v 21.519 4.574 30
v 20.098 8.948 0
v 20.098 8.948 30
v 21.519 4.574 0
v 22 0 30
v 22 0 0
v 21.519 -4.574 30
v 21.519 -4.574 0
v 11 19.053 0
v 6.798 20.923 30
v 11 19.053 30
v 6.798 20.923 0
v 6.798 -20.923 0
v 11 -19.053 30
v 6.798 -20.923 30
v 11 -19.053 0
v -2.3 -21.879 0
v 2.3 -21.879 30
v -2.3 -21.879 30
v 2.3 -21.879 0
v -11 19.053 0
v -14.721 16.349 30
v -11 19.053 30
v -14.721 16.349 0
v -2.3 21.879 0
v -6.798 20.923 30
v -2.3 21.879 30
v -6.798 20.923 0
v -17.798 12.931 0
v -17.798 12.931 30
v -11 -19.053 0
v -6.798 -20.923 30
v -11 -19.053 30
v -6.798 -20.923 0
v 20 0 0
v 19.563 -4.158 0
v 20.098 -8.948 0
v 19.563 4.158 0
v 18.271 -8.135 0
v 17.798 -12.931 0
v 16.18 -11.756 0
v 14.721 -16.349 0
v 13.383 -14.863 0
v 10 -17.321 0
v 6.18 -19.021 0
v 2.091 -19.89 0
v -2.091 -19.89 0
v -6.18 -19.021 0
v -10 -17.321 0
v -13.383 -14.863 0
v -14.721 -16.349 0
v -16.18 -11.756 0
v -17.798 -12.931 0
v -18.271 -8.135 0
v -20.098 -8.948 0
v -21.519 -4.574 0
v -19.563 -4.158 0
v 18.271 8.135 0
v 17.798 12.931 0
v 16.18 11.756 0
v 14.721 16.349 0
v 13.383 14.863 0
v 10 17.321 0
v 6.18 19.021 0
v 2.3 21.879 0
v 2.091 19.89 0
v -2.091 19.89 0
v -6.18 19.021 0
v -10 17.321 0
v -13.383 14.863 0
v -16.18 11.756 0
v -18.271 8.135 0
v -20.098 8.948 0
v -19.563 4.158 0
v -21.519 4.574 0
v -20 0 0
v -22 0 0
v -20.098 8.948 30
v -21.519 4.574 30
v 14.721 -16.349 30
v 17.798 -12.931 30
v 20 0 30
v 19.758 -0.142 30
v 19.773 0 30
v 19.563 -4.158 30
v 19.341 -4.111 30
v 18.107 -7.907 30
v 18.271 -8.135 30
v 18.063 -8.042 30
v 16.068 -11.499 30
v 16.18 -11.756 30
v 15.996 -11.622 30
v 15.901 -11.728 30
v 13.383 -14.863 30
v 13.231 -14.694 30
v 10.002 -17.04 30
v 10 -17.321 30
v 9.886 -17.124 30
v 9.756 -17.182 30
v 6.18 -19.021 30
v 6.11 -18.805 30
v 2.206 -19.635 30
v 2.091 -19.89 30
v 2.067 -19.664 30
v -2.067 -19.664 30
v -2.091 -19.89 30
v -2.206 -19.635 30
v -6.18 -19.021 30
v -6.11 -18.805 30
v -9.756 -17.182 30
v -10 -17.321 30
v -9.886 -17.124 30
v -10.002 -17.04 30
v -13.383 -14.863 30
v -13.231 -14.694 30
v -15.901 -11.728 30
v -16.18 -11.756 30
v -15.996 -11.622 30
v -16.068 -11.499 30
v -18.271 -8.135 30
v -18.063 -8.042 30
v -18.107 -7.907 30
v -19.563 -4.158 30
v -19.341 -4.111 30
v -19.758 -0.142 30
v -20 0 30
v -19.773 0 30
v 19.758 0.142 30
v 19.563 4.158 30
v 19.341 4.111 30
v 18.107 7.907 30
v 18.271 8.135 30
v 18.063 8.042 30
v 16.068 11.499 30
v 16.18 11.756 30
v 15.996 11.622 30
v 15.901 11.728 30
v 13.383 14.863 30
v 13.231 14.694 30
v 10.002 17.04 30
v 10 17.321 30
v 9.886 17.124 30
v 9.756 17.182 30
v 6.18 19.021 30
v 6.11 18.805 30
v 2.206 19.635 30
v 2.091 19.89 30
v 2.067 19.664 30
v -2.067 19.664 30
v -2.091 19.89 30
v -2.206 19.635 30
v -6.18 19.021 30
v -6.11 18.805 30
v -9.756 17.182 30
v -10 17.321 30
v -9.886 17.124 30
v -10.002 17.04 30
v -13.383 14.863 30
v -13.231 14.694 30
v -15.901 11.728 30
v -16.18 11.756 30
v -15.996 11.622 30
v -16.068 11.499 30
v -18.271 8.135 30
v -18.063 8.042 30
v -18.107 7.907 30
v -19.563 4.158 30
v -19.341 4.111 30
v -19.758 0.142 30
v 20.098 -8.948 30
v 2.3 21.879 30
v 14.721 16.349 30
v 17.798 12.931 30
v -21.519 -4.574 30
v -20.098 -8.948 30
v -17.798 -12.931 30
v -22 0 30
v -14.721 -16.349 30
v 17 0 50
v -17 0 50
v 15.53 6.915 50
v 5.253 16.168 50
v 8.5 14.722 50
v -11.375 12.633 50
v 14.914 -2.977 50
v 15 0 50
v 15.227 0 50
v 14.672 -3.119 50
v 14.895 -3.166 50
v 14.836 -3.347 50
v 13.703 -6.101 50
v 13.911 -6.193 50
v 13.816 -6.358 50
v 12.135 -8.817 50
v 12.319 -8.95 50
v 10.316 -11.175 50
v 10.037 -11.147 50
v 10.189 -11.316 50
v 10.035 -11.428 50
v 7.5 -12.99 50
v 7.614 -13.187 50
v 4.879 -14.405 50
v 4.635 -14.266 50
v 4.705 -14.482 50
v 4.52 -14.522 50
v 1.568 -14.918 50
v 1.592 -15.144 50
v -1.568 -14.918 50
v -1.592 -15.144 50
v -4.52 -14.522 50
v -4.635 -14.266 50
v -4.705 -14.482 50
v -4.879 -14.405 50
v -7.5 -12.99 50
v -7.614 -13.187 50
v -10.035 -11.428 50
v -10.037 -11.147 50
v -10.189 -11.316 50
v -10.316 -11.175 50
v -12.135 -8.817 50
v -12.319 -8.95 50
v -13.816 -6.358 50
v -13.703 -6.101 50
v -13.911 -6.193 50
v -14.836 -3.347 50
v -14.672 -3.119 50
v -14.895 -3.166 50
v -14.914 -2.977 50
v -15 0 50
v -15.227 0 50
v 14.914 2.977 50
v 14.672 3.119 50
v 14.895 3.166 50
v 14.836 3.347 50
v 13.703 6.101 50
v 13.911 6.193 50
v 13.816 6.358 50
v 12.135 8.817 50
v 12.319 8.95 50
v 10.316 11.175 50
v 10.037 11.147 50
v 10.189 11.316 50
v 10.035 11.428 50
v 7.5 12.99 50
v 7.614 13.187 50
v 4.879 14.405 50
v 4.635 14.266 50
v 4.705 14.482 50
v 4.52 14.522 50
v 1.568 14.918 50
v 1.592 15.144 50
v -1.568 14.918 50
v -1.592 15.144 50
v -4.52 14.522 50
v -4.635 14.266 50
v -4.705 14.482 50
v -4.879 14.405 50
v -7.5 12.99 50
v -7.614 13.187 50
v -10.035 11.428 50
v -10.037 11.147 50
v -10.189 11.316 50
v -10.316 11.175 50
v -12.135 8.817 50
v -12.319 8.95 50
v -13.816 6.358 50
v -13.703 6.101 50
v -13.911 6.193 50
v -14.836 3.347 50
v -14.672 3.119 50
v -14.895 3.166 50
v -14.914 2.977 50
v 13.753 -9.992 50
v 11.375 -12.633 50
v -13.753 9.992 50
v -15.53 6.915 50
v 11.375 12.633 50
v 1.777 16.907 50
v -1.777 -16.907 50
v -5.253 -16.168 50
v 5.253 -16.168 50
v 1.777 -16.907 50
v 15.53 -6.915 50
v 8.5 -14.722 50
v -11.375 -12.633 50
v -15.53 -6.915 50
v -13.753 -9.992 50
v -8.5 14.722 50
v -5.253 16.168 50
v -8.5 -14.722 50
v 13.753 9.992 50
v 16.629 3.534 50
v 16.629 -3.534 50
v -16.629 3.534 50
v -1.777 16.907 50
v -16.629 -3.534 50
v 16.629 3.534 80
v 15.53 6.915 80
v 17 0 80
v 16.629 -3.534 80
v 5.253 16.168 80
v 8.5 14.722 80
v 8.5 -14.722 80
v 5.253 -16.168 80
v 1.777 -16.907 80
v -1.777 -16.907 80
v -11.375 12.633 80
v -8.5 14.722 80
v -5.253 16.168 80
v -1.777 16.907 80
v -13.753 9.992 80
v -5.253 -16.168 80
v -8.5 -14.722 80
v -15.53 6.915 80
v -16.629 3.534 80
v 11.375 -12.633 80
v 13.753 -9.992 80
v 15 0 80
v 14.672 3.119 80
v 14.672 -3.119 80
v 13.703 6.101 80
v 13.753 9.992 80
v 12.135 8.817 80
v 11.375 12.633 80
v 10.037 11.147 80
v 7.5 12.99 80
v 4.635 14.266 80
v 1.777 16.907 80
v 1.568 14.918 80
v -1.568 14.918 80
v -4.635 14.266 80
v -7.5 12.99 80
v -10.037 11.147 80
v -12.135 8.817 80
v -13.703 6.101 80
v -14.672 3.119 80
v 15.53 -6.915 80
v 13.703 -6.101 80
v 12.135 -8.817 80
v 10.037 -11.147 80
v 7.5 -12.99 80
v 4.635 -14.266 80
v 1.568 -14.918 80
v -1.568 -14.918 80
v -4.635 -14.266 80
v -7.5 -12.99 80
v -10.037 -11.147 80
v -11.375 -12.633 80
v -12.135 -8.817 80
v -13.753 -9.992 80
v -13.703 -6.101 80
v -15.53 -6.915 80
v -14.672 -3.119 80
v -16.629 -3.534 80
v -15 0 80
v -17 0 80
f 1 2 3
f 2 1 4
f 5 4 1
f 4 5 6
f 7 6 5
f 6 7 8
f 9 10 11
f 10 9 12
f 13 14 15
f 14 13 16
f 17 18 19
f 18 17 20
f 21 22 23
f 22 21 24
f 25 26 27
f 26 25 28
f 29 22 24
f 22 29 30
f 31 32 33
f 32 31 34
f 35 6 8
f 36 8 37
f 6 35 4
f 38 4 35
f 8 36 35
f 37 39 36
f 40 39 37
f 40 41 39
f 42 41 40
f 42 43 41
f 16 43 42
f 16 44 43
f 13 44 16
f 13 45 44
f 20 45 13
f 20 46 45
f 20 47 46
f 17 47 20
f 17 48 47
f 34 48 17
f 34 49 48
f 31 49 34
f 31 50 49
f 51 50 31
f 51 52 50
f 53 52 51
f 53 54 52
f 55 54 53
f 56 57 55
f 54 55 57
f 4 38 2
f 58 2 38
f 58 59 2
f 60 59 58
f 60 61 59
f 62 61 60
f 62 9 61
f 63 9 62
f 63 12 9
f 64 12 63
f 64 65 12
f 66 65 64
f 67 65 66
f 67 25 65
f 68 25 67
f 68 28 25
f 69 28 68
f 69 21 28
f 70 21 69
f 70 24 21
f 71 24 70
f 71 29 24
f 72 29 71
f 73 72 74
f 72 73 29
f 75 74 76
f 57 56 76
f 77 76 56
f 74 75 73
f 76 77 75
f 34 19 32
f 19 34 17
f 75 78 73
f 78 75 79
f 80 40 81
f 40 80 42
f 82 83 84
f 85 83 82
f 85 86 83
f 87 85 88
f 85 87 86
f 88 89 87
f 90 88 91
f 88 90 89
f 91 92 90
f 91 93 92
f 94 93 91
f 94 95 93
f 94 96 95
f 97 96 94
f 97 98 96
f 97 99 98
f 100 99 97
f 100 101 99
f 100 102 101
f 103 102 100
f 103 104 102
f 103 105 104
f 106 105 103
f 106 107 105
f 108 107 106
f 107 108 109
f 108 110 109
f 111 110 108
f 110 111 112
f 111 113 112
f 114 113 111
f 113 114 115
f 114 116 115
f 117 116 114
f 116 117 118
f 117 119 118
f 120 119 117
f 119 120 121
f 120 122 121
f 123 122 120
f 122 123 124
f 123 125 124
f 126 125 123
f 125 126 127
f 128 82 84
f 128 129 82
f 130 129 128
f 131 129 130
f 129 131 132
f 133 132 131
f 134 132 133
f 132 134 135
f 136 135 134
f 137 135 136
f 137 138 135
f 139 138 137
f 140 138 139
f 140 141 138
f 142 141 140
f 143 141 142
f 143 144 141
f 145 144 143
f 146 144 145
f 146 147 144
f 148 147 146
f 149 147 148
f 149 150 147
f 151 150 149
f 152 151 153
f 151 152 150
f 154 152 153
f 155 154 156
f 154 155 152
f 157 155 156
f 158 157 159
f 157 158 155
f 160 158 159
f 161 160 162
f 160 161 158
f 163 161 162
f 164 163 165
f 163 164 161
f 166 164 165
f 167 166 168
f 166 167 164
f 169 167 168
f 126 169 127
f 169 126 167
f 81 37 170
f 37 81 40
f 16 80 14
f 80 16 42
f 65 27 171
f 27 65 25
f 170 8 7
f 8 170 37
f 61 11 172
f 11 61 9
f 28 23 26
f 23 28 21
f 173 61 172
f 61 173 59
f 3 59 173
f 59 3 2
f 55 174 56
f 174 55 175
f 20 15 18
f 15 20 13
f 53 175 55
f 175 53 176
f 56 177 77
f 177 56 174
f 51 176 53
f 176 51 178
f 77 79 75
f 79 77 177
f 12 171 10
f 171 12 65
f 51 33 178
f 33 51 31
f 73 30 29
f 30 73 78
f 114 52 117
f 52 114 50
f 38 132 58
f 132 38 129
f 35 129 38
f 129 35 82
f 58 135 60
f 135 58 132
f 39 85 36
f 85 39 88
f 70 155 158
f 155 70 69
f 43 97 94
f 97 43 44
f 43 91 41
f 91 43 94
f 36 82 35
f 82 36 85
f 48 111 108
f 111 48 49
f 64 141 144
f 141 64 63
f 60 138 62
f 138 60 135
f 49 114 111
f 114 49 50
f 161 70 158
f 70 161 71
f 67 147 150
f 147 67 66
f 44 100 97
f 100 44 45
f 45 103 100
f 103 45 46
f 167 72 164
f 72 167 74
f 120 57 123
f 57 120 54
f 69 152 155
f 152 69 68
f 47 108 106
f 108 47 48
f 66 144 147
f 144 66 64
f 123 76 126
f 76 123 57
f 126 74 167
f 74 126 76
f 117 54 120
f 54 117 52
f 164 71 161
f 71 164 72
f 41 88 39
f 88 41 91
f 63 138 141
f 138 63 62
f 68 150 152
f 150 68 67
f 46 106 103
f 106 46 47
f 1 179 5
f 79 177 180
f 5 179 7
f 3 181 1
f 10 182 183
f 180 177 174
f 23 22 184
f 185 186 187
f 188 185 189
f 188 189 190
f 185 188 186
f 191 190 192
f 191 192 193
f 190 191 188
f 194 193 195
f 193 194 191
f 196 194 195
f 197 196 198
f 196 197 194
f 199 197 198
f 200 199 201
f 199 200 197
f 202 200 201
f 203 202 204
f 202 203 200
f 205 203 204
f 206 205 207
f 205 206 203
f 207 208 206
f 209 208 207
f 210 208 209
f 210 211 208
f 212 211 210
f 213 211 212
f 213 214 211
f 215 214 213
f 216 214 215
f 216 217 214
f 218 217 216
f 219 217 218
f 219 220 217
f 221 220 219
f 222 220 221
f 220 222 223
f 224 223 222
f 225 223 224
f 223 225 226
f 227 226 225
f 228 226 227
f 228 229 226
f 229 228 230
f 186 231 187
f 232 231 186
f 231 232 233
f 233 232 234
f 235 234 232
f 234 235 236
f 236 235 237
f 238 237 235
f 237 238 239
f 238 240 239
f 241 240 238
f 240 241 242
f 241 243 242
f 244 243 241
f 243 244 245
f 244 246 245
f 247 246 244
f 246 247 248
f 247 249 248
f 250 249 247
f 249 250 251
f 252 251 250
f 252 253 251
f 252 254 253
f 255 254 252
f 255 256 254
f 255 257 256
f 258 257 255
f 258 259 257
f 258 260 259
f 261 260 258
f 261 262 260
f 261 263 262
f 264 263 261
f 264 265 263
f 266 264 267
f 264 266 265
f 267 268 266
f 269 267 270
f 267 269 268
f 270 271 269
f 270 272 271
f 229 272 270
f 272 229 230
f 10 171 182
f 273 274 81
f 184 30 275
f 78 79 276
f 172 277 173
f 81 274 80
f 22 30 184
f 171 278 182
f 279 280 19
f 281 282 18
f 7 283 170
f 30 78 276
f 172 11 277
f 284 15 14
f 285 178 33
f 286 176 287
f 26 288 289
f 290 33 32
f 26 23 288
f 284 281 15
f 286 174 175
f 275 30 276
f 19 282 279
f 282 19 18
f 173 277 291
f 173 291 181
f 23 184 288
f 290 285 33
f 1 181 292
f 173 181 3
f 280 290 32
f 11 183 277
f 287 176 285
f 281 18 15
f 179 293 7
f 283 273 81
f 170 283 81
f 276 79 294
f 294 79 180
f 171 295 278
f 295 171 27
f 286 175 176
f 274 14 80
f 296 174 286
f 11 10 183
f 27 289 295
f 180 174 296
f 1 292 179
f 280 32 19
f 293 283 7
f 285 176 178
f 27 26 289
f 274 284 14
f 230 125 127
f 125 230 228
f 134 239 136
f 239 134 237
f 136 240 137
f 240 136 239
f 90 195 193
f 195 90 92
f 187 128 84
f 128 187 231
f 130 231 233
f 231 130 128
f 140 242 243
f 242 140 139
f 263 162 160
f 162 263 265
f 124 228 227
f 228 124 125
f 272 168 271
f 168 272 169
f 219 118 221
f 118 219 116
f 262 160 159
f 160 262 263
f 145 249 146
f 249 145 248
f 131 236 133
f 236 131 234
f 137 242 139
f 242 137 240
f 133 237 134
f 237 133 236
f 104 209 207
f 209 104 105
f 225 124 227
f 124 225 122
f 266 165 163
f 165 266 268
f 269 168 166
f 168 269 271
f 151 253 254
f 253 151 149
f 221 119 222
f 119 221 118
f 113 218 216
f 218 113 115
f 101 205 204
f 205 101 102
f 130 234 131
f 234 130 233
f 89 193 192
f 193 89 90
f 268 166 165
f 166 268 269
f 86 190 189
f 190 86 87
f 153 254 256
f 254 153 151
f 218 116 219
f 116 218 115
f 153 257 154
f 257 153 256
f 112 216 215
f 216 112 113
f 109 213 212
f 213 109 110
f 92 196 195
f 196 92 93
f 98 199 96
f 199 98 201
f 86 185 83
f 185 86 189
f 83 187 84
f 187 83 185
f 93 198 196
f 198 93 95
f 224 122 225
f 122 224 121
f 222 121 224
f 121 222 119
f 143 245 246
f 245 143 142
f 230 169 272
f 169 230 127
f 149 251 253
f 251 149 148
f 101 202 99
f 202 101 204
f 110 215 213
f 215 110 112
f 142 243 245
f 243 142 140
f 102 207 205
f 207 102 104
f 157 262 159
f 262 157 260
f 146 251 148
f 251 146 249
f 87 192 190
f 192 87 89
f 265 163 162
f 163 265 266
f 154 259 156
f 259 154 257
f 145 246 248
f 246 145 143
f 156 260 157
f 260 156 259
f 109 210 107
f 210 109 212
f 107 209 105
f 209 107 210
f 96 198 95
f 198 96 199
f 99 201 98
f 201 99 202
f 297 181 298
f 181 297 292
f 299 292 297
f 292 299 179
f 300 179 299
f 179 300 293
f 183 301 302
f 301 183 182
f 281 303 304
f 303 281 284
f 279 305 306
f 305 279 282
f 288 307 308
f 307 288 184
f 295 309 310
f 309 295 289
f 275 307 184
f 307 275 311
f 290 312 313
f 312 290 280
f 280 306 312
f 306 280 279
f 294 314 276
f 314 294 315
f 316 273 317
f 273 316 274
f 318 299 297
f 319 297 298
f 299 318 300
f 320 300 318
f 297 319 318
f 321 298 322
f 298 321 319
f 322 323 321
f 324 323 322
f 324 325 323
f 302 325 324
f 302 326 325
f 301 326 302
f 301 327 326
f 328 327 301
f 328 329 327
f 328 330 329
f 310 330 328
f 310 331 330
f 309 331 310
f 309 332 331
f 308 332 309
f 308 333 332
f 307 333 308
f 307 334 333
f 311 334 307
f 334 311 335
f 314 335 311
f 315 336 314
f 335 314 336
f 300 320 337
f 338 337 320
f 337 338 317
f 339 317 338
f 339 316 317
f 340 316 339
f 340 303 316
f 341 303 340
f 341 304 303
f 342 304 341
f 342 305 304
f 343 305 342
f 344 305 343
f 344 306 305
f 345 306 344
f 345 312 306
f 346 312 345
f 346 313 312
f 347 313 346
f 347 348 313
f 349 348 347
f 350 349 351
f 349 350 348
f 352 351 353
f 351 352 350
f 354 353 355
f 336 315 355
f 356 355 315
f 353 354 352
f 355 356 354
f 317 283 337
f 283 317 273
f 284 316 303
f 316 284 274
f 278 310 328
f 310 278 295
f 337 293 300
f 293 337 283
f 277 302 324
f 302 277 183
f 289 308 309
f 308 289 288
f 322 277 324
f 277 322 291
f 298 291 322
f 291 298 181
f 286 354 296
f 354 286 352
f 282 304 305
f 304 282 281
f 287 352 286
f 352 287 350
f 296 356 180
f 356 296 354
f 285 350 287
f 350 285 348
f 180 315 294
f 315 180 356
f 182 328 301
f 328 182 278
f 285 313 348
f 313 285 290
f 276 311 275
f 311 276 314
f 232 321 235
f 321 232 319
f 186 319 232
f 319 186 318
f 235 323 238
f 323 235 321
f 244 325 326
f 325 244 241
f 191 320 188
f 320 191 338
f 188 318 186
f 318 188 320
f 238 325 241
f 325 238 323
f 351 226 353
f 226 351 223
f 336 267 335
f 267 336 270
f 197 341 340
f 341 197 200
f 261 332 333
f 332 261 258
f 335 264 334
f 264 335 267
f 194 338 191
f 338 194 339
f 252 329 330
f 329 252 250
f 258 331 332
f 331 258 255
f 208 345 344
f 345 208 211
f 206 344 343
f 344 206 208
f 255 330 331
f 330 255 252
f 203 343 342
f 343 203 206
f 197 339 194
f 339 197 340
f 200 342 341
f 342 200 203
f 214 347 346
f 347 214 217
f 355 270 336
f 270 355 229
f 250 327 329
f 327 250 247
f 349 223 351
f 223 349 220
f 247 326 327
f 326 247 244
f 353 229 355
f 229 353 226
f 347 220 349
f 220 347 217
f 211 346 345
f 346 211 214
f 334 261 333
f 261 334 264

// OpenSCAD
module rohr(l, innen, dicke) {
difference() {
    
    cylinder(l, innen+dicke, innen+dicke);
    translate([0, 0, -1]) cylinder(l+2, innen, innen);
}
}

rohr(30, 20, 2);
translate([0, 0, 30]) {
    difference() {
      cylinder(20, 20 + 2, 15 + 2);
      translate([0, 0, -1]) cylinder(22, 20, 15);
    }
}
translate([0, 0, 50]) rohr(30, 15, 2);
